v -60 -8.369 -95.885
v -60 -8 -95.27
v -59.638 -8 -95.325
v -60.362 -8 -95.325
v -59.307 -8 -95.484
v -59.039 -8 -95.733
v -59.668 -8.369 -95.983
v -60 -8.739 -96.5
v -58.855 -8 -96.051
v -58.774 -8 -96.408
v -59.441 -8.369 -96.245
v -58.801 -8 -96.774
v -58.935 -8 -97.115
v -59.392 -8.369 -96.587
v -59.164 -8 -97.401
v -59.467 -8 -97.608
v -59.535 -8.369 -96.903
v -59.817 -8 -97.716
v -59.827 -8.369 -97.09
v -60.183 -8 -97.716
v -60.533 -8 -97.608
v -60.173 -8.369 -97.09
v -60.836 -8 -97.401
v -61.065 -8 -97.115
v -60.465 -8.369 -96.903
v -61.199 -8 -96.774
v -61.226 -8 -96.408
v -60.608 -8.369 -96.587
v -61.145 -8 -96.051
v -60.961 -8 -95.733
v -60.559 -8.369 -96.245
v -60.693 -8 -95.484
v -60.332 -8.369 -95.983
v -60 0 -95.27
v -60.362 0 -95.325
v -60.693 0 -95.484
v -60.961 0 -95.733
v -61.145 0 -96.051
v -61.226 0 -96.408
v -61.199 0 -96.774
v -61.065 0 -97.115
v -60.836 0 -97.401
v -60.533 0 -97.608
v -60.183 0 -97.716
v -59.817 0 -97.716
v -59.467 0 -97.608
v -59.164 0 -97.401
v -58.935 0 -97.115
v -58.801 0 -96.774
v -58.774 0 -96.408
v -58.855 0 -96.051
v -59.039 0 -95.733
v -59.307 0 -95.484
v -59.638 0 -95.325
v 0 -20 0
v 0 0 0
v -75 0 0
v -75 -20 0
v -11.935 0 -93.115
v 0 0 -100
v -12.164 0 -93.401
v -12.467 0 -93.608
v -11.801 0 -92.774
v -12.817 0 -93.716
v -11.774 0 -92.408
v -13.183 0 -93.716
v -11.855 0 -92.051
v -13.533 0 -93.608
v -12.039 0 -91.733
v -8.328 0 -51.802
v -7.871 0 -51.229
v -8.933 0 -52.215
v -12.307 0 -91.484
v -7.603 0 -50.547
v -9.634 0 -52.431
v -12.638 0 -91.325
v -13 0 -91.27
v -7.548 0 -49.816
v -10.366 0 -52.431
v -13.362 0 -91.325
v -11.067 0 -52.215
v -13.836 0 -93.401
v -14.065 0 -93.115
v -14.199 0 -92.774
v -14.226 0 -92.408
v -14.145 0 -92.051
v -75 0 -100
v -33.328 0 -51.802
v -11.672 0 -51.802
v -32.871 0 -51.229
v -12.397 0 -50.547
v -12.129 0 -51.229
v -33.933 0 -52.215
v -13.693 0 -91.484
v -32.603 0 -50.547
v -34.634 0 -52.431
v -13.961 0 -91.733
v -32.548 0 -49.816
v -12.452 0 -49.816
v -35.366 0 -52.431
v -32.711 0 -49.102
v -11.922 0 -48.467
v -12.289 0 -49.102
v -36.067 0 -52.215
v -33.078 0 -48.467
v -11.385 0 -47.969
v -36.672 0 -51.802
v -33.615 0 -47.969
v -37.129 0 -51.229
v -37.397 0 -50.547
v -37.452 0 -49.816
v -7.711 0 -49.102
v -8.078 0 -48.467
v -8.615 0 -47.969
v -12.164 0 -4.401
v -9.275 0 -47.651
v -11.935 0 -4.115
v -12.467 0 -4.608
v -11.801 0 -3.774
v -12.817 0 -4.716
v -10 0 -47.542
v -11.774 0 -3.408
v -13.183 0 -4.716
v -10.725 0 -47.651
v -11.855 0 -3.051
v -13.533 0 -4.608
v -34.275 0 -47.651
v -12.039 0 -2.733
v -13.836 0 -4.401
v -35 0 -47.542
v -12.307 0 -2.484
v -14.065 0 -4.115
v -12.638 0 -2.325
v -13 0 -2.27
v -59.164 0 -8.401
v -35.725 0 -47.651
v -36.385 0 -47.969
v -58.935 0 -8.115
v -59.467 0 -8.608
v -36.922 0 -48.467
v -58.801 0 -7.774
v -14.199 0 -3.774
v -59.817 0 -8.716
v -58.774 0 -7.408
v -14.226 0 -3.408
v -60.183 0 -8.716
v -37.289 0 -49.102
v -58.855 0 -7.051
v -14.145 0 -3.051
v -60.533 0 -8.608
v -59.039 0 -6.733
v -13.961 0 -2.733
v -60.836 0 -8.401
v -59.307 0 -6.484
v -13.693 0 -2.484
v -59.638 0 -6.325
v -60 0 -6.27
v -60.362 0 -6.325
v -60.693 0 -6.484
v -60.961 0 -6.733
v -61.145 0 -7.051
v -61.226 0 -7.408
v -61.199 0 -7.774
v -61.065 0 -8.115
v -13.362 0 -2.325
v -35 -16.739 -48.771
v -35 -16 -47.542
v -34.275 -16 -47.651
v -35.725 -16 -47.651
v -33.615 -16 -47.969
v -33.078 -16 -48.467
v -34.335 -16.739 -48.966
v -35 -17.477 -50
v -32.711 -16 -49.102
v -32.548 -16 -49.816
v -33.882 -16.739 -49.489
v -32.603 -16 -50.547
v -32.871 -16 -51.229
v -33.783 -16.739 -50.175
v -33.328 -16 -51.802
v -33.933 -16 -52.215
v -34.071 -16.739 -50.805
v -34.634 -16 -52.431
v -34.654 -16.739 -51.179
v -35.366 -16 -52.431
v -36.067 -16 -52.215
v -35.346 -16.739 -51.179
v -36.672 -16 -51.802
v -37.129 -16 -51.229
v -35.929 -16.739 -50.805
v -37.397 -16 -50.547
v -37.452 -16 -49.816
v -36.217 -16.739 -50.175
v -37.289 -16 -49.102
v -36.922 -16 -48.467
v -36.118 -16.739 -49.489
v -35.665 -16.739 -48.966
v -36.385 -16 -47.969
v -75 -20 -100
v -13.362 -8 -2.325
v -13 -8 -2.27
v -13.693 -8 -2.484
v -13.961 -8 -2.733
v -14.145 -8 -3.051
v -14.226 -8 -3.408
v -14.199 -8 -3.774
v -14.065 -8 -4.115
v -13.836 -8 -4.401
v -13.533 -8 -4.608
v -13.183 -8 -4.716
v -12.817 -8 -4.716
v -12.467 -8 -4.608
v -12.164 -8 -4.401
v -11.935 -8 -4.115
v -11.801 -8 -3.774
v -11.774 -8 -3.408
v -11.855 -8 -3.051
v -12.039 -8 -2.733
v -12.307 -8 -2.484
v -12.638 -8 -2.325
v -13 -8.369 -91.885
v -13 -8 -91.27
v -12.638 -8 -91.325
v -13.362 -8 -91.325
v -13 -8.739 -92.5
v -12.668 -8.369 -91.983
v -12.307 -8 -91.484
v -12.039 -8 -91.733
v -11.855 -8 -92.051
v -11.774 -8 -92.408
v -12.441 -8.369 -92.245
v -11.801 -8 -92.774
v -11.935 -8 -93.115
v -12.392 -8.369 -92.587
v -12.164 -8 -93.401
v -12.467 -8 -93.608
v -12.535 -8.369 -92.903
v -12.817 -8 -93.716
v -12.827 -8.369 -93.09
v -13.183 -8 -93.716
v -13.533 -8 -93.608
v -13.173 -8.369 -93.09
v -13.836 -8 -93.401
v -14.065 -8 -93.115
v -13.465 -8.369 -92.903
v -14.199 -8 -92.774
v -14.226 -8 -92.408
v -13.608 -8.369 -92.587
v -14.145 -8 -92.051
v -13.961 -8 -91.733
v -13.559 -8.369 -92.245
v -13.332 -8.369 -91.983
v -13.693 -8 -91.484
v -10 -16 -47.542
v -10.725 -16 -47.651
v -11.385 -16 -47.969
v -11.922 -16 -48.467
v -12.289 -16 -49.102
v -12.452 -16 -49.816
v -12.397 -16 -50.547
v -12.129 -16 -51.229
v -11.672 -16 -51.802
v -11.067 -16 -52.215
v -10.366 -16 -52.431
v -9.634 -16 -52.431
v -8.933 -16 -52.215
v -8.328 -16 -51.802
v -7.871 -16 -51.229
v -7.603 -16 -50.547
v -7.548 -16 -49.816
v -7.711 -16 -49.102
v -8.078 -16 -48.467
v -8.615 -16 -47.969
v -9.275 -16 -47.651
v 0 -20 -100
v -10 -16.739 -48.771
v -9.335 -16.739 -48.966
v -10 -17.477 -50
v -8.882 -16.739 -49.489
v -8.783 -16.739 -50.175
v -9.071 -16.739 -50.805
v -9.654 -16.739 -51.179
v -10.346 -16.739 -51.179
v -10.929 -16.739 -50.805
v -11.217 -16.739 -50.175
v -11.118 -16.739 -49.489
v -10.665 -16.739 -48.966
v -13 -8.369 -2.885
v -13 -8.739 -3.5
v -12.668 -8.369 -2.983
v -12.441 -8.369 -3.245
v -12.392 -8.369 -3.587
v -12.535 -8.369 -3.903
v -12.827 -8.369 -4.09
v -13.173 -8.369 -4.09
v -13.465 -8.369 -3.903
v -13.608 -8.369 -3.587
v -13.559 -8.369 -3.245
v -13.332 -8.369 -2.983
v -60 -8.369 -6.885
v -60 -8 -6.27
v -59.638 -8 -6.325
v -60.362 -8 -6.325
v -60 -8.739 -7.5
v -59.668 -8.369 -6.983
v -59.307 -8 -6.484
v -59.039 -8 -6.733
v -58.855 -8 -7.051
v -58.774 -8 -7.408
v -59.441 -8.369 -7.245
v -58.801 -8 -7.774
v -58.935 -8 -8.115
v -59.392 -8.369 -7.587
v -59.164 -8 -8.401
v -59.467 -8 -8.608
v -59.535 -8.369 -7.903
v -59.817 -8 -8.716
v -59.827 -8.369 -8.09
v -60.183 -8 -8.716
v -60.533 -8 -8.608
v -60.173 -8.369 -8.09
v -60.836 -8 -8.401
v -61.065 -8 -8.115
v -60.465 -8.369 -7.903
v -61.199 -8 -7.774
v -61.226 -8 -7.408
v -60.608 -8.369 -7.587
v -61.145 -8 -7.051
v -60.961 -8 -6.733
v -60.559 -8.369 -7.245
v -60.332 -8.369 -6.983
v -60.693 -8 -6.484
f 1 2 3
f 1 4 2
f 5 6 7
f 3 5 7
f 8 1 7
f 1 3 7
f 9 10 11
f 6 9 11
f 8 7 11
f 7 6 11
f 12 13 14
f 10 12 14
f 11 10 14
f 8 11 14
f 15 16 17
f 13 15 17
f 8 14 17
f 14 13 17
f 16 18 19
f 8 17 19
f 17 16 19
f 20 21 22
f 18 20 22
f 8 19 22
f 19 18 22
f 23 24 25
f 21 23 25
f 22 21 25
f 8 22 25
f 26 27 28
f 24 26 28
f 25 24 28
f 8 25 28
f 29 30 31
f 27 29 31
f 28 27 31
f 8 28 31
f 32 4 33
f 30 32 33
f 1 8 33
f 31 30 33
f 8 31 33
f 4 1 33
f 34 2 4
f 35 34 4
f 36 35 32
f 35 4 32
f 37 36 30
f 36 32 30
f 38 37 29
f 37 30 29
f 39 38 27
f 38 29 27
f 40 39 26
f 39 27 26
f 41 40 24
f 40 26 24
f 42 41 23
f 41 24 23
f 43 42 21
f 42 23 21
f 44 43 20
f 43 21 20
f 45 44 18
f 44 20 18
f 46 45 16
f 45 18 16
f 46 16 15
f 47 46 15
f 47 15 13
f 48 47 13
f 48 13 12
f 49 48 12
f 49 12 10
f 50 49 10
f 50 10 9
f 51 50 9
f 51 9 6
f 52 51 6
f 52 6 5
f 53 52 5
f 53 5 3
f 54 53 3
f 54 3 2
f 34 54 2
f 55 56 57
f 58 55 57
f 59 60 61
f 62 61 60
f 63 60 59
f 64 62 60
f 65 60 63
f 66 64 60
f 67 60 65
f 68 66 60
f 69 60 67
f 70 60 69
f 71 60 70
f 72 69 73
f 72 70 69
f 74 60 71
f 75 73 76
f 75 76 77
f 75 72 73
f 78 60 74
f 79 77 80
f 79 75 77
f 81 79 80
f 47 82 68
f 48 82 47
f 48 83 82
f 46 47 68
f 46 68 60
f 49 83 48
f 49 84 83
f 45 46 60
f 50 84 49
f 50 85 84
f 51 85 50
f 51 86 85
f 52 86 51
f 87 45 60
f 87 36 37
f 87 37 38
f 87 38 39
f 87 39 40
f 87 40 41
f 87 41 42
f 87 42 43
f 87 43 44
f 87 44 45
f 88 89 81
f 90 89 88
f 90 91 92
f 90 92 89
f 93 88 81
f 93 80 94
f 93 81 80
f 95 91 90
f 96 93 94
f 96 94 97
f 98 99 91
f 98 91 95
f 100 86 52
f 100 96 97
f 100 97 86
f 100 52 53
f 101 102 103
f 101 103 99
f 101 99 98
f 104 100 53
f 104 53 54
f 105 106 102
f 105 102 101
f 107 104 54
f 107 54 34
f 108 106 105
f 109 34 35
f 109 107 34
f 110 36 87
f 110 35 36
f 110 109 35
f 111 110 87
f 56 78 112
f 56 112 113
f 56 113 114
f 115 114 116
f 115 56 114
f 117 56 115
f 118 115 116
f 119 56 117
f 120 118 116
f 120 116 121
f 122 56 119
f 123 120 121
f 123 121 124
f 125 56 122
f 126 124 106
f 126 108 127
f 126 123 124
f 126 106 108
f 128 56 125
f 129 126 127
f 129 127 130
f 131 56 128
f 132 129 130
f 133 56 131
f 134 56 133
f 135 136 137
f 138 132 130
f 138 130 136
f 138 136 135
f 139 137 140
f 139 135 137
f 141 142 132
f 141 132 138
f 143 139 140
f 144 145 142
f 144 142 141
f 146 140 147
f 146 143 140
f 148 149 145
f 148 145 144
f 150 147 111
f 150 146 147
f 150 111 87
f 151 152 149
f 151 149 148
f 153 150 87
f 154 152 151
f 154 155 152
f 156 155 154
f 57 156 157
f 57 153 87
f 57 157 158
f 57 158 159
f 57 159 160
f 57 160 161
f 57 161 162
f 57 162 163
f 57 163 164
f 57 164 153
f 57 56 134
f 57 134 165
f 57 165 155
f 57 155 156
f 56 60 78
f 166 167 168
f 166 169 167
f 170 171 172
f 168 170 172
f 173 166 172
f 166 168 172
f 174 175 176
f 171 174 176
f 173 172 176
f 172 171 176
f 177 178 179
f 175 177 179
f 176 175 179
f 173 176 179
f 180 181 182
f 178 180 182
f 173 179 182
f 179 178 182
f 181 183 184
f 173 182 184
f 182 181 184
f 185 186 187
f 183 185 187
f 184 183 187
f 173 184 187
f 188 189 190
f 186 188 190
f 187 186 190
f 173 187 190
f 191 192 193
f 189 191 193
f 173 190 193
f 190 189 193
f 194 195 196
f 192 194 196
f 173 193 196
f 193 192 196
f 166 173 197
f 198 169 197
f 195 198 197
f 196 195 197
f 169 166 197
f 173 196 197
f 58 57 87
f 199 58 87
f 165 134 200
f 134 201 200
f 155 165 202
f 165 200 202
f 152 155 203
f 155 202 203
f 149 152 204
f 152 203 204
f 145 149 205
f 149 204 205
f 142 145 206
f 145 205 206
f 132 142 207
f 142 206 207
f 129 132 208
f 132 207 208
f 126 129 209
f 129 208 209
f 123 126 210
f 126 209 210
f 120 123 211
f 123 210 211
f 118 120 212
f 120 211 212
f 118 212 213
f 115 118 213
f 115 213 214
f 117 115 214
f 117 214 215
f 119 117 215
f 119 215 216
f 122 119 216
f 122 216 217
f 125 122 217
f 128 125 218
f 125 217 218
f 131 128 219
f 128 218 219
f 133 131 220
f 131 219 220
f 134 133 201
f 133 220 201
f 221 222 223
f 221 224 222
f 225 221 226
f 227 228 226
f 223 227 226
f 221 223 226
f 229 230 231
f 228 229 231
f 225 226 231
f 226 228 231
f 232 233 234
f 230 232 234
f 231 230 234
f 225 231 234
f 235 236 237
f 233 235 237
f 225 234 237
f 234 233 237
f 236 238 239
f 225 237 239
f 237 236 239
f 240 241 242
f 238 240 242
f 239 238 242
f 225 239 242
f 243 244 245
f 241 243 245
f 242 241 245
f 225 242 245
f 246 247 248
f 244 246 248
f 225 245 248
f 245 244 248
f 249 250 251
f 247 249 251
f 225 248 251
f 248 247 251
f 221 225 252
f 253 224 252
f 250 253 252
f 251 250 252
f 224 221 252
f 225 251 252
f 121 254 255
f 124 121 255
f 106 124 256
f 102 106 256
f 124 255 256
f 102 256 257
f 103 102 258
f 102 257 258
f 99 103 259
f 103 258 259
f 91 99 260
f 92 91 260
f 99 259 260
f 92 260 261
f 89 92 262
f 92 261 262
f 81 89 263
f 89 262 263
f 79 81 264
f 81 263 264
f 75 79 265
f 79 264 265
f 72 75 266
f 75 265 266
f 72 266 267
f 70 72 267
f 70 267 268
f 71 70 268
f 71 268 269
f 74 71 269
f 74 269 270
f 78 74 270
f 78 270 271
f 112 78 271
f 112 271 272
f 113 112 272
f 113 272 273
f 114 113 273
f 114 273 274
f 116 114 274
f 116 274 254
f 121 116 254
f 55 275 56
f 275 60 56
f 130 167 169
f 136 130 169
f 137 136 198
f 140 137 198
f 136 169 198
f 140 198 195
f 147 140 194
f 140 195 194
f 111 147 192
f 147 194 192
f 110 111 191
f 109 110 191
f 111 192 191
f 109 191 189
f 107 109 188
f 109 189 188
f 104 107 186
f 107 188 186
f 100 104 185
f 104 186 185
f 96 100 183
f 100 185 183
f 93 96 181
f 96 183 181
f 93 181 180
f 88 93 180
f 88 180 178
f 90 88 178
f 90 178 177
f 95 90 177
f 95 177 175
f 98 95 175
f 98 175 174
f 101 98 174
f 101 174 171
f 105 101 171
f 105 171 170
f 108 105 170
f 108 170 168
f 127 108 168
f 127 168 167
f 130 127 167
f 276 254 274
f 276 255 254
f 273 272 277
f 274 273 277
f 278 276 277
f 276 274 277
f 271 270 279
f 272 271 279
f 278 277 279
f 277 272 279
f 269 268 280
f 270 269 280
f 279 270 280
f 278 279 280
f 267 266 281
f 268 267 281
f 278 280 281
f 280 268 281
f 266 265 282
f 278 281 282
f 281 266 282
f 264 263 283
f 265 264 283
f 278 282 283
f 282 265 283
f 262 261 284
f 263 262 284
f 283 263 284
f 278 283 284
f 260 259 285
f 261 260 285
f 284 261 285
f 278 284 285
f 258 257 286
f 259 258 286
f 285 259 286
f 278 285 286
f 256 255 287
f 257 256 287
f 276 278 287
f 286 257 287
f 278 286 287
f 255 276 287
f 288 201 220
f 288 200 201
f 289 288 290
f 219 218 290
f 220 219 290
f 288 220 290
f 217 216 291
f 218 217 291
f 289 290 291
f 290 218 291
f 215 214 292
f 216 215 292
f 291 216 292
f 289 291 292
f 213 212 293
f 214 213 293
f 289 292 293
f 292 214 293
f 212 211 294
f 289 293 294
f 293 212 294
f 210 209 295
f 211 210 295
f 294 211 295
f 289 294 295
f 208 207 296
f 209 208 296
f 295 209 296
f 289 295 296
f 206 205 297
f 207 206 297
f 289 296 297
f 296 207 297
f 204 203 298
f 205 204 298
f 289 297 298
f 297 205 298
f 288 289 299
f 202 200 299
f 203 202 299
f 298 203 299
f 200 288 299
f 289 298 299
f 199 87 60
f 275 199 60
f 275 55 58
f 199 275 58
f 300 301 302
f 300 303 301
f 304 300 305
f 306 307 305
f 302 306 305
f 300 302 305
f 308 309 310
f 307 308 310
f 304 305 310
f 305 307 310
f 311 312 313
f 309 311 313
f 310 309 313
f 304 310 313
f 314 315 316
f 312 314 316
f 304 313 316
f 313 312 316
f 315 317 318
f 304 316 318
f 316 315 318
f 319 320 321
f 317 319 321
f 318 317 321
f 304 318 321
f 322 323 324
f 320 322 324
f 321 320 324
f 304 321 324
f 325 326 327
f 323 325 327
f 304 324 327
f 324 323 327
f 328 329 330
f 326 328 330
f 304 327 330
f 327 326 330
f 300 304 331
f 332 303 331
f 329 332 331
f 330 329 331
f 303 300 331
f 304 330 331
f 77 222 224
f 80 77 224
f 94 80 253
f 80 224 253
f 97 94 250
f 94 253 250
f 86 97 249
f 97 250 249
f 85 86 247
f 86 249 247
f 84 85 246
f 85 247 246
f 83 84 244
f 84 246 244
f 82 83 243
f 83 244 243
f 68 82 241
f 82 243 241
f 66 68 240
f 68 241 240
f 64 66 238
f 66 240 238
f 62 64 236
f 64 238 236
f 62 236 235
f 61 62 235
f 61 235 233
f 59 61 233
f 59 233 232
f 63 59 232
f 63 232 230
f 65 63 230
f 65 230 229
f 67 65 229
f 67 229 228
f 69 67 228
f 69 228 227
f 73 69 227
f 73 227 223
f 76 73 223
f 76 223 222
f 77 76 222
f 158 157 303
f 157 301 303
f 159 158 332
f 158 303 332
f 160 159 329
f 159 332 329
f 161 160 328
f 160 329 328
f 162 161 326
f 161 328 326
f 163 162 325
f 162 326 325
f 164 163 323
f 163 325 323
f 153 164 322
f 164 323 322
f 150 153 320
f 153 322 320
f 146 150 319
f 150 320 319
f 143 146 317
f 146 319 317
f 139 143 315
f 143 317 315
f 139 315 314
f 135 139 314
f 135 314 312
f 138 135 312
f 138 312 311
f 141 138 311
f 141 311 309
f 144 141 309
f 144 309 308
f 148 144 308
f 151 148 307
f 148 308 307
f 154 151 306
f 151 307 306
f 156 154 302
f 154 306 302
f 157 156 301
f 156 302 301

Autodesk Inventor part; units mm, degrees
ref_plane "YZ Plane" through (0, 0, 0) normal (1, 0, 0) x (0, 1, 0)
ref_plane "XZ Plane" through (0, 0, 0) normal (0, 1, 0) x (-1, 0, 0)
ref_plane "XY Plane" through (0, 0, 0) normal (0, 0, 1) x (1, 0, 0)
sketch "Sketch1" plane through (0, 0, 0) normal (0, 1, 0) x (-1, 0, 0)
  line L0 (0, 0) -> (75, 0)
  line L1 (75, 0) -> (75, -100)
  line L2 (75, -100) -> (0, -100)
  line L3 (0, -100) -> (0, 0)
  point P0 (60, -7.5)
  point P1 (13, -3.5)
  point P2 (60, -96.5)
  point P3 (13, -92.5)
  point P4 (35, -50)
  point P5 (10, -50)
  point P6 (0, -50)
  dimension "d0" = 75
  dimension "d1" = 100
  dimension "d2" = 7.5
  dimension "d3" = 3.5
  dimension "d4" = 3.5
  dimension "d5" = 7.5
  dimension "d6" = 47
  dimension "d7" = 47
  dimension "d8" = 15
  dimension "d9" = 15
  dimension "d10" = 25
  dimension "d11" = 10
extrude "Extrusion1" add sketch "Sketch1" against normal blind 20
hole "Hole1" at (-13, 0, -3.5) at (-60, 0, -7.5) at (-13, 0, -92.5) at (-60, 0, -96.5) direction (0, -1, 0) diameter 2.459 depth 8 tip angle 118 thread size "M3x0.5" class "6H" standard "ISO Metric profile"
hole "Hole2" at (-35, 0, -50) at (-10, 0, -50) direction (0, -1, 0) diameter 4.917 depth 16 tip angle 118 thread size "M6x1" class "6H" standard "ISO Metric profile"
properties part number "2x-servo-boards-QS-series"
